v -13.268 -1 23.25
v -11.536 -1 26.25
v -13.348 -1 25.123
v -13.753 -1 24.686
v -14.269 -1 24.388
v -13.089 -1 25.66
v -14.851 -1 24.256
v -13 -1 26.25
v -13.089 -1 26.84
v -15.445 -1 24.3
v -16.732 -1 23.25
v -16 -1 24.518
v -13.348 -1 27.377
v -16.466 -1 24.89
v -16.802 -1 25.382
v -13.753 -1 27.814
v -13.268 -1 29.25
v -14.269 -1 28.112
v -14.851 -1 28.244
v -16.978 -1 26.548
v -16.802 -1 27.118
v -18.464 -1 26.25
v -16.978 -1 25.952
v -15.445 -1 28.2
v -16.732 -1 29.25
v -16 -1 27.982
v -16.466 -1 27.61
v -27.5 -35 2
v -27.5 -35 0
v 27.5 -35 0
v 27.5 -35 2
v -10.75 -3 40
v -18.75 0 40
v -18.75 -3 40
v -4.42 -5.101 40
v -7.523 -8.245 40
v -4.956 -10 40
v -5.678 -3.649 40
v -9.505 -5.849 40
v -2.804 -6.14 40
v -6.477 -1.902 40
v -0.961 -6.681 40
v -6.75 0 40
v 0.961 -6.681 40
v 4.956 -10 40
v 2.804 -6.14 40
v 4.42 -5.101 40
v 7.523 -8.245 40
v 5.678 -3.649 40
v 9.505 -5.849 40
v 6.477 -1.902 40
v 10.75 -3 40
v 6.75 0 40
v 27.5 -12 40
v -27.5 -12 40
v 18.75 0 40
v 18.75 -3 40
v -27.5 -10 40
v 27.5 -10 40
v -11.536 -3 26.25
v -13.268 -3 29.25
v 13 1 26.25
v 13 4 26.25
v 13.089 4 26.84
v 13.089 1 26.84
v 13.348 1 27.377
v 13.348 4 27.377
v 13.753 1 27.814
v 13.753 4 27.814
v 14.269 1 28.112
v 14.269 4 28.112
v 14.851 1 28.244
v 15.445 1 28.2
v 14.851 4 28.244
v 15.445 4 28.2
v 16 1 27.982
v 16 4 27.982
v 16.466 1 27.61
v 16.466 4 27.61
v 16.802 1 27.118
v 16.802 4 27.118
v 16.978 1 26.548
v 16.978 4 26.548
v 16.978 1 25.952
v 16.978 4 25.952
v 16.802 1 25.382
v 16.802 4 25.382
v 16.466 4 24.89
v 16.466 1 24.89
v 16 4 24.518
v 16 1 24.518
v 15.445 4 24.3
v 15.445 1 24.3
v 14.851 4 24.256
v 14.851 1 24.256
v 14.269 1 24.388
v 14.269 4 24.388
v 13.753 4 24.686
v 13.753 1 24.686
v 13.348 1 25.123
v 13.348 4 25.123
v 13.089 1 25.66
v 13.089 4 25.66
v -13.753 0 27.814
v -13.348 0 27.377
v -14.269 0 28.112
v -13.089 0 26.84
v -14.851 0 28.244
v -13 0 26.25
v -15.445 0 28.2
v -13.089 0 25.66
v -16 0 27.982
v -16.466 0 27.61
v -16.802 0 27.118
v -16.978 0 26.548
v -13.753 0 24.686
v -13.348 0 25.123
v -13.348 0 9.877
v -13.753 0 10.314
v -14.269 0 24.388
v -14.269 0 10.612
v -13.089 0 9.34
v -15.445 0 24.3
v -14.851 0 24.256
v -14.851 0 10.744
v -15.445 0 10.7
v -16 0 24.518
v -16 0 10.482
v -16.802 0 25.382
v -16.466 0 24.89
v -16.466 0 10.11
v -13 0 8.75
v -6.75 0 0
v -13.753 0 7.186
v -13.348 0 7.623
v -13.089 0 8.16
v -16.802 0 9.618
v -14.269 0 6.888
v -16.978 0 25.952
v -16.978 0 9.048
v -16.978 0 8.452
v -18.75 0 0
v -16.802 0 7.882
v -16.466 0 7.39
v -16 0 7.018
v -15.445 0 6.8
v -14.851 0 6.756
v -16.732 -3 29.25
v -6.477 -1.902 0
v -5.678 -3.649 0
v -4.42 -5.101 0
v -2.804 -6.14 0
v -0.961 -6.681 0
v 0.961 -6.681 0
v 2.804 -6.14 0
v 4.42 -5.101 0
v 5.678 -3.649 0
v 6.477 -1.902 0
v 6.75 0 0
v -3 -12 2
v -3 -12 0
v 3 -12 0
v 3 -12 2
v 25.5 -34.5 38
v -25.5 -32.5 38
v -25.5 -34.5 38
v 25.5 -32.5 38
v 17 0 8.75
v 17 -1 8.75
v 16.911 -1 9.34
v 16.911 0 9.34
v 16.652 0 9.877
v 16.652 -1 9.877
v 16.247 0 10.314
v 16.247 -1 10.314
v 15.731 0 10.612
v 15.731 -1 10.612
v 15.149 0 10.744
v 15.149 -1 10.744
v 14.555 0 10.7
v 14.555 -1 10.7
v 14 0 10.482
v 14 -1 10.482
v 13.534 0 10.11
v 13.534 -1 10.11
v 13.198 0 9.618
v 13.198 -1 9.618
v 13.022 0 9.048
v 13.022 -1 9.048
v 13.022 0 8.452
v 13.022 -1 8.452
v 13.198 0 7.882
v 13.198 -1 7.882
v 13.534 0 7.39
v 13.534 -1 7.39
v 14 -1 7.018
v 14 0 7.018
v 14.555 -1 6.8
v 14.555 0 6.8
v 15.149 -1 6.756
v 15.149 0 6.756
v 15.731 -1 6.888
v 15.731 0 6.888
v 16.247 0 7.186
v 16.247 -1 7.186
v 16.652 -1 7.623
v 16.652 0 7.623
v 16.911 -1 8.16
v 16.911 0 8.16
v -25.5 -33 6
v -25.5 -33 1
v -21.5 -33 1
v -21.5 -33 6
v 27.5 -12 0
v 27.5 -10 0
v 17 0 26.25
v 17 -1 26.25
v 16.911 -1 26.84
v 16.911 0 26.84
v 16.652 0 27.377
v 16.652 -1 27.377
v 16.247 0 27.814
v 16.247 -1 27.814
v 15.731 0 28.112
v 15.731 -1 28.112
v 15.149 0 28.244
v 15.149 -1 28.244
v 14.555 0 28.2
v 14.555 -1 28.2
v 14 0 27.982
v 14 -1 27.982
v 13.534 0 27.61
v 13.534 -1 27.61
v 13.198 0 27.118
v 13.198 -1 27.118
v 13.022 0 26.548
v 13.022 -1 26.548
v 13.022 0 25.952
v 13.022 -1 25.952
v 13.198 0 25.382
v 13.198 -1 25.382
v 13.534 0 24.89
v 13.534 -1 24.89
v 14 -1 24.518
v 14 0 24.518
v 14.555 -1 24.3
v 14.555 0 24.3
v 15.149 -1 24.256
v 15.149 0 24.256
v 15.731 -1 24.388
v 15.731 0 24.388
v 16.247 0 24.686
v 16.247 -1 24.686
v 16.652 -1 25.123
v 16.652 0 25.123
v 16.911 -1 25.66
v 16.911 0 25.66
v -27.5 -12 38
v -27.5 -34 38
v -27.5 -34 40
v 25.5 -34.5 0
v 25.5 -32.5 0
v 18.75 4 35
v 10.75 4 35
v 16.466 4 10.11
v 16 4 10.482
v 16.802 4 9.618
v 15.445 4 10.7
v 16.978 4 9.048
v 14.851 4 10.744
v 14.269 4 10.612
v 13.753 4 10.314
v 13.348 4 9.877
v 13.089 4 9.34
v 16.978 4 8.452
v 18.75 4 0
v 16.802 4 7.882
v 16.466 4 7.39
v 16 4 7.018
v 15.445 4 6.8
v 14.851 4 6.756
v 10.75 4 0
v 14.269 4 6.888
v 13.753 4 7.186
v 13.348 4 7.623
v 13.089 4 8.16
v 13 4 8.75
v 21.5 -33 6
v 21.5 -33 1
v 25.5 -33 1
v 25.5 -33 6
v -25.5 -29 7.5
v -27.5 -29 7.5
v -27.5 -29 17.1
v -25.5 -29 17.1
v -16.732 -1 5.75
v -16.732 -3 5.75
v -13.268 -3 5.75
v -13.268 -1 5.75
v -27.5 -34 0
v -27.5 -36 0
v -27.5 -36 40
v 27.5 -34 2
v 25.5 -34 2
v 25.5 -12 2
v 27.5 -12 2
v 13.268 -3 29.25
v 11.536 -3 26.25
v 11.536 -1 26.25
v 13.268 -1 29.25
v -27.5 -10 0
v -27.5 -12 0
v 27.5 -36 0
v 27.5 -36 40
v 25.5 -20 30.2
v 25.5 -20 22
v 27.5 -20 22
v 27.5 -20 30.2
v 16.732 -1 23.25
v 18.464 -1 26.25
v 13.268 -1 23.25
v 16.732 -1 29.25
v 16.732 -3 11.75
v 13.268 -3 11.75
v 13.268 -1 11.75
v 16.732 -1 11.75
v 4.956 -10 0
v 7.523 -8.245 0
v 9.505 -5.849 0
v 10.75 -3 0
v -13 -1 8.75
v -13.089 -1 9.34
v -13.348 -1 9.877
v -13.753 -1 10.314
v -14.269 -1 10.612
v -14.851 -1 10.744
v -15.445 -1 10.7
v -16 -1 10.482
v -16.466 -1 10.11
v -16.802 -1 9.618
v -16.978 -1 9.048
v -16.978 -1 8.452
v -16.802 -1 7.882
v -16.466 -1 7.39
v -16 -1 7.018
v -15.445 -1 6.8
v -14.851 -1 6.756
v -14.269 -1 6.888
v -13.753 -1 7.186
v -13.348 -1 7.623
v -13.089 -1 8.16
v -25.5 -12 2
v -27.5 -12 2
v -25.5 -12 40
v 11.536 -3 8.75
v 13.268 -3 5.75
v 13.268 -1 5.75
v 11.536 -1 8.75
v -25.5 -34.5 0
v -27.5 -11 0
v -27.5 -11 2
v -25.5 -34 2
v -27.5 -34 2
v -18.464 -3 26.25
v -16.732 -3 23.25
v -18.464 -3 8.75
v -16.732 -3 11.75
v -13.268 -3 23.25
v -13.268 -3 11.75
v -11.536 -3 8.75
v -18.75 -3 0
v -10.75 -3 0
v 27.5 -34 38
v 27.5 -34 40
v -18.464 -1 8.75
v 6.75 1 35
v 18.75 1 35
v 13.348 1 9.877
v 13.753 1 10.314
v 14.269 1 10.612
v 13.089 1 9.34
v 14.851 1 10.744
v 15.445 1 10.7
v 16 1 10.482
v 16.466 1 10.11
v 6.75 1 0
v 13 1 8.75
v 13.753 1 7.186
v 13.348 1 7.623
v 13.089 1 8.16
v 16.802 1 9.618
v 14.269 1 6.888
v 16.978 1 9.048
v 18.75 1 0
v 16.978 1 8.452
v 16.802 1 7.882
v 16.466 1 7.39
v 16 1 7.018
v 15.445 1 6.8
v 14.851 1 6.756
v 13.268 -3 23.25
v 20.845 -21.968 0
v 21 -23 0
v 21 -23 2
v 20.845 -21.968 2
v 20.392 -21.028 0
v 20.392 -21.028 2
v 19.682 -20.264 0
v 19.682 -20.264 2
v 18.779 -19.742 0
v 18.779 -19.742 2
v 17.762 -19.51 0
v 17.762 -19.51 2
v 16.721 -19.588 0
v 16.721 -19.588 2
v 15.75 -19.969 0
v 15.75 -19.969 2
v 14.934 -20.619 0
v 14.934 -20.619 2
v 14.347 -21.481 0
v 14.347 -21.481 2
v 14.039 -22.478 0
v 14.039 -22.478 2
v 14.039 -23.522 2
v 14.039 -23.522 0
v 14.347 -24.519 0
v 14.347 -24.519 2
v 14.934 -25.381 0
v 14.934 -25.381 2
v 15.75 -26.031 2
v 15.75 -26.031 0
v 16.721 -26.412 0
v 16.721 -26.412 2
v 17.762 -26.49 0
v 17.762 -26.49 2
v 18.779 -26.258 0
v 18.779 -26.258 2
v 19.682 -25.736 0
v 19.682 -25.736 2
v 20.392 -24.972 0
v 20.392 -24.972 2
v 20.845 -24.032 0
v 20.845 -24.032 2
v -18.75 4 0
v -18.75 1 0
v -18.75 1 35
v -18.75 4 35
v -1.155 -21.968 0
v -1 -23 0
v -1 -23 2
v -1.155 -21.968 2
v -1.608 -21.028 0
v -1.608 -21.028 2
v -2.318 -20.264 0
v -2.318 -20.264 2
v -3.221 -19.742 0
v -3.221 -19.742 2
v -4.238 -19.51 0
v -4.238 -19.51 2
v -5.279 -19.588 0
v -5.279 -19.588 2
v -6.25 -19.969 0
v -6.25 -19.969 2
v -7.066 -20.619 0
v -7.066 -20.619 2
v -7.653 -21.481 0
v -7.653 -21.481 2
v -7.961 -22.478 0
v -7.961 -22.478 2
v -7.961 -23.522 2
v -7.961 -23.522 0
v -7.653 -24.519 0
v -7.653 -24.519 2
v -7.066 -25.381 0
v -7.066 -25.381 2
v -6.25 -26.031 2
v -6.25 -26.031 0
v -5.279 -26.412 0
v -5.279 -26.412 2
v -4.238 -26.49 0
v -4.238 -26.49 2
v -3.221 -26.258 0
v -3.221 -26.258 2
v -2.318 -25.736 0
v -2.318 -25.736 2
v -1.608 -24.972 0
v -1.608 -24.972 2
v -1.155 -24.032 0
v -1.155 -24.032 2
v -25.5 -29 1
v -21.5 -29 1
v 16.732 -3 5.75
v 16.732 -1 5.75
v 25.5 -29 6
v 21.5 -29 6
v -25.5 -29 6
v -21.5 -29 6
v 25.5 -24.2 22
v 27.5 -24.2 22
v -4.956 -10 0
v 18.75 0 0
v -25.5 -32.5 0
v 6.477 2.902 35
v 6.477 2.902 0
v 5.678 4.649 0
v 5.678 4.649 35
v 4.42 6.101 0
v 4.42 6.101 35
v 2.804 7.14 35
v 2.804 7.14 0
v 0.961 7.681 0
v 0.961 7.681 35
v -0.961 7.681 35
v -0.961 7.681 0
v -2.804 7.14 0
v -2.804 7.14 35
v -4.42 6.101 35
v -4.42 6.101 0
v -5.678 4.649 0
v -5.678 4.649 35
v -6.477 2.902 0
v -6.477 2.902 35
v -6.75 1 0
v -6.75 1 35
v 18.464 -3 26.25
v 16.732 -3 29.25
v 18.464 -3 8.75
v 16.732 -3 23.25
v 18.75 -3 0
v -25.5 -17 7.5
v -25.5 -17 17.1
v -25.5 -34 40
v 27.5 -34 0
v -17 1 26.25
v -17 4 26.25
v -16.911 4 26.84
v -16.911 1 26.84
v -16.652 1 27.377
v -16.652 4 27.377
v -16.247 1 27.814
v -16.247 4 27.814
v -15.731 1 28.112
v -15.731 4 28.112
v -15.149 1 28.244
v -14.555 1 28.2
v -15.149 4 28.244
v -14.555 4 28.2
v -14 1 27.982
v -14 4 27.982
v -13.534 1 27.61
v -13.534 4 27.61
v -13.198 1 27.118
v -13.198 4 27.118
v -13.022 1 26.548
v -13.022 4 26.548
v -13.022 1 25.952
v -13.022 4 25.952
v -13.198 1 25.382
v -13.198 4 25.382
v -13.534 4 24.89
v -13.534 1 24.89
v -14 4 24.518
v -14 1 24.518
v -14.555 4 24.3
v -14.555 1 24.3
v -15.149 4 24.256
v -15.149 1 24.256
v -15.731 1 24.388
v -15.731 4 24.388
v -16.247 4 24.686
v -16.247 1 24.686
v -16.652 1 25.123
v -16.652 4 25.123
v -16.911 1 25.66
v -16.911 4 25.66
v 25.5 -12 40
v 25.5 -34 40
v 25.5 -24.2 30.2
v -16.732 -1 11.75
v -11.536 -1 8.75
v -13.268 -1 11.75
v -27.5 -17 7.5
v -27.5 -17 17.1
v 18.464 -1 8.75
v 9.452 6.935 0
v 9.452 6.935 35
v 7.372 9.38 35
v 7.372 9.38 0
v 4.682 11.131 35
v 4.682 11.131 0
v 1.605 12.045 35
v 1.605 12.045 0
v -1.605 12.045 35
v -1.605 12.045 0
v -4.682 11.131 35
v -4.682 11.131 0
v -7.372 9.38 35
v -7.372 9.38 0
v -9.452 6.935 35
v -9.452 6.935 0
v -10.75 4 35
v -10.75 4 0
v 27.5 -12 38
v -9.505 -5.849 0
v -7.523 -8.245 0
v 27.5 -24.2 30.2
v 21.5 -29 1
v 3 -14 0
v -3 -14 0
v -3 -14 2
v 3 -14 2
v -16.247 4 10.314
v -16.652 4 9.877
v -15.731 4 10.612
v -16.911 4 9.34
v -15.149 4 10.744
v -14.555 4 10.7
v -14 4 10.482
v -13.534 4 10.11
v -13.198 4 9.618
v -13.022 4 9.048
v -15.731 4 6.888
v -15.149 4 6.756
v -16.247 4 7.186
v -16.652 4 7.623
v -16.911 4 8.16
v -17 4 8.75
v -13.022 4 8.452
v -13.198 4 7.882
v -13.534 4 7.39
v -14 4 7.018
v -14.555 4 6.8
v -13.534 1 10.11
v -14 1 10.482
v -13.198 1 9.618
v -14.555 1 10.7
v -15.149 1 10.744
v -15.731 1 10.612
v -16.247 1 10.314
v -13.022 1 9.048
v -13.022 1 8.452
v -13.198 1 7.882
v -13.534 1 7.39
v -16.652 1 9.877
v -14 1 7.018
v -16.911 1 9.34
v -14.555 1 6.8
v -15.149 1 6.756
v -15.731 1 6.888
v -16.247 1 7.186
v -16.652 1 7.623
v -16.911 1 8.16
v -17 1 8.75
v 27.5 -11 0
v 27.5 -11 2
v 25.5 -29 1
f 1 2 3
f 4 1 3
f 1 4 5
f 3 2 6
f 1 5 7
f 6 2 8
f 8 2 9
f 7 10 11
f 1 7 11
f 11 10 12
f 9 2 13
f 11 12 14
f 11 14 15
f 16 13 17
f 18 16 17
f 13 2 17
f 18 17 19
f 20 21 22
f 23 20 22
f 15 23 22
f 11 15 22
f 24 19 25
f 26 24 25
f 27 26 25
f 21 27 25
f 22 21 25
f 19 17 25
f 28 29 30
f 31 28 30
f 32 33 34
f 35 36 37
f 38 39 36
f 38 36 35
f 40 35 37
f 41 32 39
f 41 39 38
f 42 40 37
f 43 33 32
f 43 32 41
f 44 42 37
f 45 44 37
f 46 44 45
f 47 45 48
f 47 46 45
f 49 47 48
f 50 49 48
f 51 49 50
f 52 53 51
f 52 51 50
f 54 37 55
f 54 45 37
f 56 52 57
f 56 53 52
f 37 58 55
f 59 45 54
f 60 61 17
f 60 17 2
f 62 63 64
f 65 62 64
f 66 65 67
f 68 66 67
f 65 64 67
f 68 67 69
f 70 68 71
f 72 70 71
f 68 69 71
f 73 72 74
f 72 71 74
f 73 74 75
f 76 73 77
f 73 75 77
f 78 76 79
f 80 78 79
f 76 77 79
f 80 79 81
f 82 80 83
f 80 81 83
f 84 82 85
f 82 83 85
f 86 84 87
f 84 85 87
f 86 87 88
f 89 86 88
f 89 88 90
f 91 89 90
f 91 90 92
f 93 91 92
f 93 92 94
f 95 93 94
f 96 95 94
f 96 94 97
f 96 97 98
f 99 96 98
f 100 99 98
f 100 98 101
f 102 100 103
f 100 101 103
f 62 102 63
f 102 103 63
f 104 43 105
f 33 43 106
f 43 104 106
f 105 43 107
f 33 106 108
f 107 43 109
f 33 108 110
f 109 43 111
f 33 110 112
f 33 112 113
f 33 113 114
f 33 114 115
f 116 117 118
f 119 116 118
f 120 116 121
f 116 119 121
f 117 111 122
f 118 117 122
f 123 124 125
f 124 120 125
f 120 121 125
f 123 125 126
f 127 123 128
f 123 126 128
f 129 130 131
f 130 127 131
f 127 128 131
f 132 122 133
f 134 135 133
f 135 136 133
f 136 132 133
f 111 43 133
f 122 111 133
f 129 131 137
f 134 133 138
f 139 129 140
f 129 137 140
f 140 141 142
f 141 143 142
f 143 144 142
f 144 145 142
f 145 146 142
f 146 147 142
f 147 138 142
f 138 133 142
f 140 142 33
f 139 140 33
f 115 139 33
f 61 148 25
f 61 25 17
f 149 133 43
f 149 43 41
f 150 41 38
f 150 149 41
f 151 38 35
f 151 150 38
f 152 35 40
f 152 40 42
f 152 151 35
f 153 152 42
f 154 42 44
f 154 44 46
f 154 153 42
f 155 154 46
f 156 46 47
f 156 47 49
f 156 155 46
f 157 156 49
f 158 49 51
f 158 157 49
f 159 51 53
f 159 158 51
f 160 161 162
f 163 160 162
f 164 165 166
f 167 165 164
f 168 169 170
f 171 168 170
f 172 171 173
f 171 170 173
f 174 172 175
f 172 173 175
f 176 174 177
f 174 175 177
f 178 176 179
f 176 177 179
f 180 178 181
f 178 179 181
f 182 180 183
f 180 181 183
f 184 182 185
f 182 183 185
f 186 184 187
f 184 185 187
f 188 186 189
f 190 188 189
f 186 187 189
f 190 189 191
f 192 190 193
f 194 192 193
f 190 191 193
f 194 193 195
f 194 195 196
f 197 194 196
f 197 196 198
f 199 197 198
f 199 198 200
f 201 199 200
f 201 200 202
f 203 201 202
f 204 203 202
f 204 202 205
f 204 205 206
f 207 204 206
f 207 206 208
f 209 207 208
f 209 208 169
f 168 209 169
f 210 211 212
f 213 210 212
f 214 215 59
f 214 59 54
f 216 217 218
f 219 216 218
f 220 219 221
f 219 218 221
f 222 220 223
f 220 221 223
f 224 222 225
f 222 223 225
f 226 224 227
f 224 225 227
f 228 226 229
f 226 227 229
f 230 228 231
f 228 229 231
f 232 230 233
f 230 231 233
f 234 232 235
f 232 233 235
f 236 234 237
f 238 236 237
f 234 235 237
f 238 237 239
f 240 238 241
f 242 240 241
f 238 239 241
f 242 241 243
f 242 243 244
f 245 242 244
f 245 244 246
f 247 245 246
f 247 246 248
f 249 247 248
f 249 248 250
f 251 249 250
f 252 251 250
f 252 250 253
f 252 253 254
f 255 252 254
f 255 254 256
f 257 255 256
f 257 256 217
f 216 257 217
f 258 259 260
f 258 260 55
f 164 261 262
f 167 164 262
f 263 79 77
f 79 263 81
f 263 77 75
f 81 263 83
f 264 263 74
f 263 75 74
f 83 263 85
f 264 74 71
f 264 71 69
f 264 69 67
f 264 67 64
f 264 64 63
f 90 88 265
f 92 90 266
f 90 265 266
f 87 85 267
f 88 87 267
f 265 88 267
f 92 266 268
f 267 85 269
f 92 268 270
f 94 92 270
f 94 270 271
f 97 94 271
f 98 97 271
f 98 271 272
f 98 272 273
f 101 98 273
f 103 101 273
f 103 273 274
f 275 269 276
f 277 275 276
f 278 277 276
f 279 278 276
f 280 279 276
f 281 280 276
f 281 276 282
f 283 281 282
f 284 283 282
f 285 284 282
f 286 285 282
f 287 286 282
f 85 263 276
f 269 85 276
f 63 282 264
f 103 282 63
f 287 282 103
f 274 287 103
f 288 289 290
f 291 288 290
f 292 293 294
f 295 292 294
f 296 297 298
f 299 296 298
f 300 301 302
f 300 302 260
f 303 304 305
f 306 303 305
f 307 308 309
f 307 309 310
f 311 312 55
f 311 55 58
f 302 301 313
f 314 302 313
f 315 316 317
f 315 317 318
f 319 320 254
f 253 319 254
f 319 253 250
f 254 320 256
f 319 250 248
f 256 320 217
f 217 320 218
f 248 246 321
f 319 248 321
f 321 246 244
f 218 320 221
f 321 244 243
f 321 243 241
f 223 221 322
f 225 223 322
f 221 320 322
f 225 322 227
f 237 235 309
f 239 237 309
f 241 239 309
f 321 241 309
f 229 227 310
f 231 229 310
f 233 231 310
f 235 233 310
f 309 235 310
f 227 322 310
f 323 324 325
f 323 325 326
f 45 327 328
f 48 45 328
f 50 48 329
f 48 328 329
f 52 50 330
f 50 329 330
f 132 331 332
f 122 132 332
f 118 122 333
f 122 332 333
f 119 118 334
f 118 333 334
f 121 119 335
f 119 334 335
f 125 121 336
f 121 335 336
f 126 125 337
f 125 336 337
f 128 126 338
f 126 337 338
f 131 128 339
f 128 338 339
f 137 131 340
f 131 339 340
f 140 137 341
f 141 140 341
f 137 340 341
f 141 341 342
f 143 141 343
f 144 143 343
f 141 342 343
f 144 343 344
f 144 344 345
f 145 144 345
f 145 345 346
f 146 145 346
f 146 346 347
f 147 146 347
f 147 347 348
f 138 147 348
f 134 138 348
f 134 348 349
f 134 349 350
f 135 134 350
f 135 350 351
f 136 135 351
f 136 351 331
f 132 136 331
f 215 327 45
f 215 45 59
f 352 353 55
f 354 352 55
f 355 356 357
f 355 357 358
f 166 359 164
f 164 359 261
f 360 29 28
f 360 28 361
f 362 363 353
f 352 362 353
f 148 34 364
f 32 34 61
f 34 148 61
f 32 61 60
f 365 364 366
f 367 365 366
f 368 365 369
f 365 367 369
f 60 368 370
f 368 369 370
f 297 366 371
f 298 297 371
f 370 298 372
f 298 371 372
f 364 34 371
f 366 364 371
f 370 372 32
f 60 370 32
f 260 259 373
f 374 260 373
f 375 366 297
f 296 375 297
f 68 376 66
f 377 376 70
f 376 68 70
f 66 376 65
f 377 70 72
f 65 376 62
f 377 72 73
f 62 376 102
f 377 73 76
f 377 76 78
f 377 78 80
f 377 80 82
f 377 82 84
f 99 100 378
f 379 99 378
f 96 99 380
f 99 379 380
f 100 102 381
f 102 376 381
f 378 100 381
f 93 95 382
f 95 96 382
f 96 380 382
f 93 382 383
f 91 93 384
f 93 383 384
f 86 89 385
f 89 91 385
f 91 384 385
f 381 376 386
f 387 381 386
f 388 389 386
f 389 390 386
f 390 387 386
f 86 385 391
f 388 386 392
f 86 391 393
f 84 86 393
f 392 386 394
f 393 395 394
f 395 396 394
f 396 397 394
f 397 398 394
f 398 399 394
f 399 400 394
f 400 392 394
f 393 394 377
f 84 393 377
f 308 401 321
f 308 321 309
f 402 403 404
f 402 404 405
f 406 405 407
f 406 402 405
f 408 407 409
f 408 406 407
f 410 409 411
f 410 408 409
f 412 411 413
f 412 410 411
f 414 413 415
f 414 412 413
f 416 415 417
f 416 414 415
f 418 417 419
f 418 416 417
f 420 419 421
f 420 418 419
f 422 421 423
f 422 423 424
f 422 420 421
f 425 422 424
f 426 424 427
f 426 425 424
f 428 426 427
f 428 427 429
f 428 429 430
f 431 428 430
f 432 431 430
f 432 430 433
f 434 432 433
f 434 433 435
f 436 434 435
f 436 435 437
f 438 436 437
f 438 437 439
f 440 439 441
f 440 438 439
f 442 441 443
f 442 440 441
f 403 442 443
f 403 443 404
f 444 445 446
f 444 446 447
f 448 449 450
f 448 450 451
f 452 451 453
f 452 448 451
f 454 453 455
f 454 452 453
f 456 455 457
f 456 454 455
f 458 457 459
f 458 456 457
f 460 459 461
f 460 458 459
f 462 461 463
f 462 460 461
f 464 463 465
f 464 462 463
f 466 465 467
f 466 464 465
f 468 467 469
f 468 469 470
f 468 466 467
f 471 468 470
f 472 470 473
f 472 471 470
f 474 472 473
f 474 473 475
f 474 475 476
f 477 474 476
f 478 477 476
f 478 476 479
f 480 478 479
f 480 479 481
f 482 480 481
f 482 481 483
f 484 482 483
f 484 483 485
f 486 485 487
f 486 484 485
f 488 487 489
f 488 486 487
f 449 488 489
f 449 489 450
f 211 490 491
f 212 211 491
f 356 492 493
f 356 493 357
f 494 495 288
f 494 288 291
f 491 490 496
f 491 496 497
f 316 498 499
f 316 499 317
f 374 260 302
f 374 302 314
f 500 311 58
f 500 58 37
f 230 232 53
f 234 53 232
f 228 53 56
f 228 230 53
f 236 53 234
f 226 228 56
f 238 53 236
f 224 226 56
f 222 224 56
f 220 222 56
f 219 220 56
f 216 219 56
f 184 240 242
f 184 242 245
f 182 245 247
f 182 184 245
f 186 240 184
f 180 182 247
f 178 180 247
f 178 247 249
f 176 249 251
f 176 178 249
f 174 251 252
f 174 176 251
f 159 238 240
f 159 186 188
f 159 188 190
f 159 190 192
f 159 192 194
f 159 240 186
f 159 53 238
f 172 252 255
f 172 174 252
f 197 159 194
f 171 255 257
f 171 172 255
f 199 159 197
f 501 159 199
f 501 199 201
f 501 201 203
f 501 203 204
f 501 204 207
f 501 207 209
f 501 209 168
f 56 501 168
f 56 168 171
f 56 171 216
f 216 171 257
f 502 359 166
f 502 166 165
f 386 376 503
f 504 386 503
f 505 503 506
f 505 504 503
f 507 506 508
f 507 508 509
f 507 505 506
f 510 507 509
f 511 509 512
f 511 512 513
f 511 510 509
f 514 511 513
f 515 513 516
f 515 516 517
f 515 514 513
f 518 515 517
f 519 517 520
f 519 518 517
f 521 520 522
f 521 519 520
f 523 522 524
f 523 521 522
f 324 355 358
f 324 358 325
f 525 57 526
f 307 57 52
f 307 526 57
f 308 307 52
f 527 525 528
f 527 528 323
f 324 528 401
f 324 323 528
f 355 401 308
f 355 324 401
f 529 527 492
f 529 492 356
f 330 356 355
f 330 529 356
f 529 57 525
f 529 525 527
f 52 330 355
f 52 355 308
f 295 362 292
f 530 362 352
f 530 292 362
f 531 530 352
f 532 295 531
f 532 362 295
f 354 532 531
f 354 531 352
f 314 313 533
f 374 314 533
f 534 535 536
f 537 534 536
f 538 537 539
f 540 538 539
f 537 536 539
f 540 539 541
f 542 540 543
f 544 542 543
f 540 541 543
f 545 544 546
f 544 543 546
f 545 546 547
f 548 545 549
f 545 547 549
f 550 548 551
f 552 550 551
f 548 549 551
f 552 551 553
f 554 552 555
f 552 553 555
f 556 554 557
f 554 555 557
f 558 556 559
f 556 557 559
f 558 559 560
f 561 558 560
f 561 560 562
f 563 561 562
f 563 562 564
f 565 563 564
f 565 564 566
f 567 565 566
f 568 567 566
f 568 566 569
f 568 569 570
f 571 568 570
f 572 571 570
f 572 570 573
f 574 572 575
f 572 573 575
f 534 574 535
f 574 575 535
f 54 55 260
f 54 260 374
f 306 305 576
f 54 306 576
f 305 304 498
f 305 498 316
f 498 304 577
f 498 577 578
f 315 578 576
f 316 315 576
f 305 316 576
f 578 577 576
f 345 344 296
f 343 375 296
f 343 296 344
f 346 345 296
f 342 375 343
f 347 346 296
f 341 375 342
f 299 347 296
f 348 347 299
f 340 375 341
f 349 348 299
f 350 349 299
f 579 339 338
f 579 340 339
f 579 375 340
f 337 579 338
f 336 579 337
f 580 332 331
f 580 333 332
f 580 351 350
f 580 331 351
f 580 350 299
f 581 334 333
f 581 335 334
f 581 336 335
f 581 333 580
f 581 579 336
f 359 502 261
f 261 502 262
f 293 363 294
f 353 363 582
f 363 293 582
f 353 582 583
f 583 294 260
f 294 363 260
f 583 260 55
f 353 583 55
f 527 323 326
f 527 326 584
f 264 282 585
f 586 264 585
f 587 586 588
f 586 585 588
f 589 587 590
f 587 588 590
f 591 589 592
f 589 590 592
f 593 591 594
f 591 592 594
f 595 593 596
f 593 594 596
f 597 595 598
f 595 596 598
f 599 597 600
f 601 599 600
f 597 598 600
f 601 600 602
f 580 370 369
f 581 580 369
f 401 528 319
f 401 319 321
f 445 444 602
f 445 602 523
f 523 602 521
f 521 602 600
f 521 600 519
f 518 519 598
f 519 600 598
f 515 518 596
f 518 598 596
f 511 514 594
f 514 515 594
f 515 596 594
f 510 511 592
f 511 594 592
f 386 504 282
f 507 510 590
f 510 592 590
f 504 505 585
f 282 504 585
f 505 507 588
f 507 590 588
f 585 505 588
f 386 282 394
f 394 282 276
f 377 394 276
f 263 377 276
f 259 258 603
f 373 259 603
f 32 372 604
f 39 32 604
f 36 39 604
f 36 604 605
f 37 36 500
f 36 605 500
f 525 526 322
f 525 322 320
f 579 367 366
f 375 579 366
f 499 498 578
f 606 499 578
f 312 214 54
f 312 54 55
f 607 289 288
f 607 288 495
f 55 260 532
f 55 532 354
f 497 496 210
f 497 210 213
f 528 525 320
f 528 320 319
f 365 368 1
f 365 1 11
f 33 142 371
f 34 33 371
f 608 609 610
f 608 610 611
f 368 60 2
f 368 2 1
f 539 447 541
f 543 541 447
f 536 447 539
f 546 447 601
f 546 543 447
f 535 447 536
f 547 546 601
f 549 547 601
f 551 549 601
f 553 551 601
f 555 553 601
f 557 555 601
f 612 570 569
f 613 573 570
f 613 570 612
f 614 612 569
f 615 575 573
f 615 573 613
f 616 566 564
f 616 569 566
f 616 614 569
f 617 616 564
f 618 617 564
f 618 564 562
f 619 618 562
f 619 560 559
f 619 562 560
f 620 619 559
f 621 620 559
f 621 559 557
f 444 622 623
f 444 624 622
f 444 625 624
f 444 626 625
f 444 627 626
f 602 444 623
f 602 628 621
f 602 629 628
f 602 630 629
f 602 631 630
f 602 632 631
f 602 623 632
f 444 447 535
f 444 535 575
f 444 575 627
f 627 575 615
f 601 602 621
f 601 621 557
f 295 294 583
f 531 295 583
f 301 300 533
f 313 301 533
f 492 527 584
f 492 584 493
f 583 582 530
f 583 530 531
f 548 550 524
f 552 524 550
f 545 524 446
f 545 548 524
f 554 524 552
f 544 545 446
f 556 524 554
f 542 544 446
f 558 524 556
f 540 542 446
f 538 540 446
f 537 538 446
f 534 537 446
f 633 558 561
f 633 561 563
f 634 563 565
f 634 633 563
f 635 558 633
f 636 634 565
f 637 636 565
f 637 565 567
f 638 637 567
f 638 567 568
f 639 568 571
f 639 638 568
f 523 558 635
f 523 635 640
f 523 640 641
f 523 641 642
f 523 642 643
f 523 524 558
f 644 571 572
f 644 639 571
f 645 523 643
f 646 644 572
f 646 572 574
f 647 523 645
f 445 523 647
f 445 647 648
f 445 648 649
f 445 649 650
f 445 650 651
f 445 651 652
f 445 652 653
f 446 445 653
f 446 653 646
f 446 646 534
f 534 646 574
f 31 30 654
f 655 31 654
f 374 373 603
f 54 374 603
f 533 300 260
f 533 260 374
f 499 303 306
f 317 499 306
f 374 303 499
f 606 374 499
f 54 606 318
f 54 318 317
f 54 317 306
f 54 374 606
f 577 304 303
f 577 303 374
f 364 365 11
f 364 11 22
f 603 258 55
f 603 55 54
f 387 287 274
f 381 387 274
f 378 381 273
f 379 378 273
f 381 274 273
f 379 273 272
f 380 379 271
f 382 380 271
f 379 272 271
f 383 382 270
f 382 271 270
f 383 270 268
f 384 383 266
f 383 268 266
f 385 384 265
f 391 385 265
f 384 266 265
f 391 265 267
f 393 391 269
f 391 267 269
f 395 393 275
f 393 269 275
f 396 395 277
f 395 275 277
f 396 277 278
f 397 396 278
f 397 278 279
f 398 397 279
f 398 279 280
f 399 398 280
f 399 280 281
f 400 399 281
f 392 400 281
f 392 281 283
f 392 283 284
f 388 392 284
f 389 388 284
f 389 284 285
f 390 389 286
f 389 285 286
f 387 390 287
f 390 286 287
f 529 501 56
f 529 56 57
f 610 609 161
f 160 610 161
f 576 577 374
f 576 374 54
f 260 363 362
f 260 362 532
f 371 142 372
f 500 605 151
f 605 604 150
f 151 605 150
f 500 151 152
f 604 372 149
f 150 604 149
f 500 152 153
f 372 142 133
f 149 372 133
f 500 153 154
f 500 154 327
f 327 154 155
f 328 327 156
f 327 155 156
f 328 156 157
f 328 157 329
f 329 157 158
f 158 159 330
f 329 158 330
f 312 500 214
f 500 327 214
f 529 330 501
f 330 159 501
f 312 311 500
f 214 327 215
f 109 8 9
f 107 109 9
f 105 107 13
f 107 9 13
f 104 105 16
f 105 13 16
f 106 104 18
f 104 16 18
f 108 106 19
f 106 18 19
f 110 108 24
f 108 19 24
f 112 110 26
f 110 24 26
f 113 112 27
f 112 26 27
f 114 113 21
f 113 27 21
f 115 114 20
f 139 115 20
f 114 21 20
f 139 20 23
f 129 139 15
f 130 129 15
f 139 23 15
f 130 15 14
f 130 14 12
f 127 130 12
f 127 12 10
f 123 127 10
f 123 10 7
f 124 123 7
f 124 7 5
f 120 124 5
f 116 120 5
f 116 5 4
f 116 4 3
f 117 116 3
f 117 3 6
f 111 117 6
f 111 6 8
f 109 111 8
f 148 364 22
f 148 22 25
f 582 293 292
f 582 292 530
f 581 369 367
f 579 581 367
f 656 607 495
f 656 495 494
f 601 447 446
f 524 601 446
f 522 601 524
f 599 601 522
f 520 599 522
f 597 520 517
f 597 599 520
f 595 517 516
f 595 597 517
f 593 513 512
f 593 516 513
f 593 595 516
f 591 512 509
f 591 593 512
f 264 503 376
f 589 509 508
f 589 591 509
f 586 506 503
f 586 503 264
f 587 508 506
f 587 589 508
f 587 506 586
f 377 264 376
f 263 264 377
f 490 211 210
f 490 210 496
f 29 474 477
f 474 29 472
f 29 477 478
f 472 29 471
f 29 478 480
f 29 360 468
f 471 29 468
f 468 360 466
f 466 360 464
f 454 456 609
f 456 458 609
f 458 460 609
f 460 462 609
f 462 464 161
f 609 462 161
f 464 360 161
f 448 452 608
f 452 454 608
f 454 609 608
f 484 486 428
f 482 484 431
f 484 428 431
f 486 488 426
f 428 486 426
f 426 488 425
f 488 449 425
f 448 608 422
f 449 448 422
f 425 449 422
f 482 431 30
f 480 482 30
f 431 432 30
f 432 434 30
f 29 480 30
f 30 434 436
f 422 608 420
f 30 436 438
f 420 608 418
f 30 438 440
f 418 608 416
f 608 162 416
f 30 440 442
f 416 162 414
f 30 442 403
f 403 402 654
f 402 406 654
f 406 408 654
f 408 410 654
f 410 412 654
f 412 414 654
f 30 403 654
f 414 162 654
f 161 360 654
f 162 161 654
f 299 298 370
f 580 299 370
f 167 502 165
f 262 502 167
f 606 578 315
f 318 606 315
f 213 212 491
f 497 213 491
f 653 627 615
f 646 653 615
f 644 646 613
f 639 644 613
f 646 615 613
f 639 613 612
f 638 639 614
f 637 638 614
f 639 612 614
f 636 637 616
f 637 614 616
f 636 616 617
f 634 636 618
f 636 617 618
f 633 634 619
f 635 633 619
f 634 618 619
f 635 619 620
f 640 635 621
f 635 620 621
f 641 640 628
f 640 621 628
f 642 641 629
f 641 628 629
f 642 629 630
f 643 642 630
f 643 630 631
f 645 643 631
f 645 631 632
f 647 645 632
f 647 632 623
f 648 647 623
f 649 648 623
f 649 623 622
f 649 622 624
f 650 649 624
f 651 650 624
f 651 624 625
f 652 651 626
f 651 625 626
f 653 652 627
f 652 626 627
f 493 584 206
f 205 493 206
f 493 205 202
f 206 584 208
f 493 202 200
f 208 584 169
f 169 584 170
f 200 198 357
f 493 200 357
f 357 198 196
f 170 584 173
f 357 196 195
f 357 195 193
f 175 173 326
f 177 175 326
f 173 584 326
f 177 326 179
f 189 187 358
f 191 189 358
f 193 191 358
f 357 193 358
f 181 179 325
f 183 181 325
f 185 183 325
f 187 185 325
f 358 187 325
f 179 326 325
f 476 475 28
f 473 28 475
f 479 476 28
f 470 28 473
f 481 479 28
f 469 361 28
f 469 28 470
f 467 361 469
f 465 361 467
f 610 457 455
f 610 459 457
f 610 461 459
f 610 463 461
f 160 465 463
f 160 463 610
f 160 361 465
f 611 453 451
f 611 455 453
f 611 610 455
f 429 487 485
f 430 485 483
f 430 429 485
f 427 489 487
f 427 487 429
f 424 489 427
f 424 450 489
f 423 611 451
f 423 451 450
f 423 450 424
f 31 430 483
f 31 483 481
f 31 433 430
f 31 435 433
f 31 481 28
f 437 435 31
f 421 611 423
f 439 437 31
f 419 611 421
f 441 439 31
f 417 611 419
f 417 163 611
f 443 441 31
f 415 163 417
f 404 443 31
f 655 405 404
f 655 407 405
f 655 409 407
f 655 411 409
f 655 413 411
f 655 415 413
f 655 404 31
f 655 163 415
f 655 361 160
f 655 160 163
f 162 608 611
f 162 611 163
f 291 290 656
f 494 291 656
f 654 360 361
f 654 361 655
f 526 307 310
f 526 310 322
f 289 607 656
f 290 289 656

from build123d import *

# Parameters (mm, degrees)
SKETCH_W        = 55
SKETCH_H        = 24
SKETCH_R        = 3.5
SKETCH_W_2      = 6
SKETCH_H_2      = 2
PAD001_DEPTH    = 2
SKETCH002_W     = 55
SKETCH002_H     = 2
PAD002_DEPTH    = 40
SKETCH003_W     = 51
SKETCH003_H     = 2
PAD003_DEPTH    = 38
SKETCH004_W     = 4
SKETCH004_H     = 4
PAD004_DEPTH    = 5
SKETCH005_W     = 4
SKETCH005_H     = 4
PAD005_DEPTH    = 5
PAD_DEPTH       = 35
SKETCH006_R     = 2
POCKET_DEPTH    = 3
PAD006_DEPTH    = 40
SKETCH009_R     = 2
POCKET001_DEPTH = 3
POCKET002_DEPTH = 2
SKETCH011_W     = 55
SKETCH011_H     = 22
PAD007_DEPTH    = 2
SKETCH012_W     = 22
SKETCH012_H     = 38
SKETCH012_W_2   = 4.2
SKETCH012_H_2   = 8.2
PAD008_DEPTH    = 2
SKETCH014_W     = 22
SKETCH014_H     = 38
SKETCH014_W_2   = 12
SKETCH014_H_2   = 9.6
PAD009_DEPTH    = 2


with BuildPart() as top:
    # Sketch → Pad001 (new body)
    with BuildSketch(Plane(origin=(0, -23, 0), x_dir=(1, 0, 0), z_dir=(0, 0, 1))):
        Rectangle(SKETCH_W, SKETCH_H)
        with Locations((17.5, 0)):
            Circle(SKETCH_R, mode=Mode.SUBTRACT)
        with Locations((-4.5, 0)):
            Circle(SKETCH_R, mode=Mode.SUBTRACT)
        with Locations((0, 10)):
            Rectangle(SKETCH_W_2, SKETCH_H_2, mode=Mode.SUBTRACT)
    extrude(amount=PAD001_DEPTH)


with BuildPart() as side_opposite_mount:
    # Sketch002 → Pad002 (new body)
    with BuildSketch(Plane(origin=(0, -35, 0), x_dir=(1, 0, 0), z_dir=(0, 0, 1))):
        Rectangle(SKETCH002_W, SKETCH002_H)
    extrude(amount=PAD002_DEPTH)


with BuildPart() as ledge_for_bottom_sides_cover:
    # Sketch003 → Pad003 (new body)
    with BuildSketch(Plane(origin=(0, -33.5, 0), x_dir=(1, 0, 0), z_dir=(0, 0, 1))):
        Rectangle(SKETCH003_W, SKETCH003_H)
    extrude(amount=PAD003_DEPTH)


with BuildPart() as screw_right:
    # Sketch004 → Pad004 (new body)
    with BuildSketch(Plane(origin=(-23.5, -31, 1), x_dir=(1, 0, 0), z_dir=(0, 0, 1))):
        Rectangle(SKETCH004_W, SKETCH004_H)
    extrude(amount=PAD004_DEPTH)


with BuildPart() as screw_left:
    # Sketch005 → Pad005 (new body)
    with BuildSketch(Plane(origin=(23.5, -31, 1), x_dir=(1, 0, 0), z_dir=(0, 0, 1))):
        Rectangle(SKETCH005_W, SKETCH005_H)
    extrude(amount=PAD005_DEPTH)


with BuildPart() as mount_clip_pocket:
    # Sketch008 → Pad (new body)
    with BuildSketch(Plane(origin=(0, 1, 0), x_dir=(1, 0, 0), z_dir=(0, 0, 1))):
        with BuildLine():
            Line((6.75, 0), (18.75, 0))
            Line((18.75, 0), (18.75, 3))
            Line((18.75, 3), (10.75, 3))
            ThreePointArc((10.75, 3), (0, 11.160757), (-10.75, 3))
            Line((-18.75, 3), (-10.75, 3))
            Line((-18.75, 0), (-18.75, 3))
            Line((-6.75, 0), (-18.75, 0))
            ThreePointArc((6.75, 0), (0, 6.75), (-6.75, 0))
        make_face()
    extrude(amount=PAD_DEPTH)

    # Sketch006 → Pocket (cut)
    with BuildSketch(Plane(origin=(0, 4, 0), x_dir=(-1, 0, 0), z_dir=(0, 1, 0))):
        with Locations((15, 8.75)):
            Circle(SKETCH006_R)
        with Locations((-15, 8.75)):
            Circle(SKETCH006_R)
        with Locations((-15, 26.25)):
            Circle(SKETCH006_R)
        with Locations((15, 26.25)):
            Circle(SKETCH006_R)
    extrude(amount=-POCKET_DEPTH, mode=Mode.SUBTRACT)


with BuildPart() as pocket002:
    # Sketch001 → Pad006 (new body)
    with BuildSketch(Plane.XY):
        with BuildLine():
            Line((-6.75, 0), (-18.75, 0))
            Line((-18.75, 0), (-18.75, -3))
            Line((-18.75, -3), (-10.75, -3))
            ThreePointArc((-10.75, -3), (-8.597677, -7.11635), (-4.956057, -10))
            Line((-27.5, -10), (-4.956057, -10))
            Line((-27.5, -12), (-27.5, -10))
            Line((27.5, -12), (-27.5, -12))
            Line((27.5, -10), (27.5, -12))
            Line((4.956057, -10), (27.5, -10))
            ThreePointArc((4.956057, -10), (8.597677, -7.11635), (10.75, -3))
            Line((18.75, -3), (10.75, -3))
            Line((18.75, 0), (18.75, -3))
            Line((6.75, 0), (18.75, 0))
            ThreePointArc((-6.75, 0), (0, -6.75), (6.75, 0))
        make_face()
    extrude(amount=PAD006_DEPTH)

    # Sketch009 → Pocket001 (cut)
    with BuildSketch(Plane.XZ.offset(3)):
        with Locations((15, 8.75)):
            Circle(SKETCH009_R)
        with Locations((-15, 8.75)):
            Circle(SKETCH009_R)
        with Locations((-15, 26.25)):
            Circle(SKETCH009_R)
        with Locations((15, 26.25)):
            Circle(SKETCH009_R)
    extrude(amount=-POCKET001_DEPTH, mode=Mode.SUBTRACT)

    # Sketch010 → Pocket002 (cut)
    with BuildSketch(Plane.XZ.offset(3)):
        Polygon((-16.732051, 29.25), (-13.267949, 29.25), (-11.535898, 26.25), (-13.267949, 23.25), (-16.732051, 23.25), (-18.464102, 26.25), align=None)
        Polygon((11.535898, 26.25), (13.267949, 29.25), (16.732051, 29.25), (18.464102, 26.25), (16.732051, 23.25), (13.267949, 23.25), align=None)
        Polygon((13.267949, 11.75), (16.732051, 11.75), (18.464102, 8.75), (16.732051, 5.75), (13.267949, 5.75), (11.535898, 8.75), align=None)
        Polygon((-11.535898, 8.75), (-13.267949, 11.75), (-16.732051, 11.75), (-18.464102, 8.75), (-16.732051, 5.75), (-13.267949, 5.75), align=None)
    extrude(amount=-POCKET002_DEPTH, mode=Mode.SUBTRACT)


with BuildPart() as cover_bottom:
    # Sketch011 → Pad007 (new body)
    with BuildSketch(Plane(origin=(0, -23, 38), x_dir=(1, 0, 0), z_dir=(0, 0, 1))):
        Rectangle(SKETCH011_W, SKETCH011_H)
    extrude(amount=PAD007_DEPTH)


with BuildPart() as cover_side_usb:
    # Sketch012 → Pad008 (new body)
    with BuildSketch(Plane(origin=(25.5, -23, 21), x_dir=(0, 1, 0), z_dir=(1, 0, 0))):
        Rectangle(SKETCH012_W, SKETCH012_H)
        with Locations((0.9, 5.1)):
            Rectangle(SKETCH012_W_2, SKETCH012_H_2, mode=Mode.SUBTRACT)
    extrude(amount=PAD008_DEPTH)


with BuildPart() as cover_side_power:
    # Sketch014 → Pad009 (new body)
    with BuildSketch(Plane(origin=(-27.5, -23, 21), x_dir=(0, 1, 0), z_dir=(1, 0, 0))):
        Rectangle(SKETCH014_W, SKETCH014_H)
        with Locations((0, -8.7)):
            Rectangle(SKETCH014_W_2, SKETCH014_H_2, mode=Mode.SUBTRACT)
    extrude(amount=PAD009_DEPTH)


solid = Compound([top.part, side_opposite_mount.part, ledge_for_bottom_sides_cover.part, screw_right.part, screw_left.part, mount_clip_pocket.part, pocket002.part, cover_bottom.part, cover_side_usb.part, cover_side_power.part])
